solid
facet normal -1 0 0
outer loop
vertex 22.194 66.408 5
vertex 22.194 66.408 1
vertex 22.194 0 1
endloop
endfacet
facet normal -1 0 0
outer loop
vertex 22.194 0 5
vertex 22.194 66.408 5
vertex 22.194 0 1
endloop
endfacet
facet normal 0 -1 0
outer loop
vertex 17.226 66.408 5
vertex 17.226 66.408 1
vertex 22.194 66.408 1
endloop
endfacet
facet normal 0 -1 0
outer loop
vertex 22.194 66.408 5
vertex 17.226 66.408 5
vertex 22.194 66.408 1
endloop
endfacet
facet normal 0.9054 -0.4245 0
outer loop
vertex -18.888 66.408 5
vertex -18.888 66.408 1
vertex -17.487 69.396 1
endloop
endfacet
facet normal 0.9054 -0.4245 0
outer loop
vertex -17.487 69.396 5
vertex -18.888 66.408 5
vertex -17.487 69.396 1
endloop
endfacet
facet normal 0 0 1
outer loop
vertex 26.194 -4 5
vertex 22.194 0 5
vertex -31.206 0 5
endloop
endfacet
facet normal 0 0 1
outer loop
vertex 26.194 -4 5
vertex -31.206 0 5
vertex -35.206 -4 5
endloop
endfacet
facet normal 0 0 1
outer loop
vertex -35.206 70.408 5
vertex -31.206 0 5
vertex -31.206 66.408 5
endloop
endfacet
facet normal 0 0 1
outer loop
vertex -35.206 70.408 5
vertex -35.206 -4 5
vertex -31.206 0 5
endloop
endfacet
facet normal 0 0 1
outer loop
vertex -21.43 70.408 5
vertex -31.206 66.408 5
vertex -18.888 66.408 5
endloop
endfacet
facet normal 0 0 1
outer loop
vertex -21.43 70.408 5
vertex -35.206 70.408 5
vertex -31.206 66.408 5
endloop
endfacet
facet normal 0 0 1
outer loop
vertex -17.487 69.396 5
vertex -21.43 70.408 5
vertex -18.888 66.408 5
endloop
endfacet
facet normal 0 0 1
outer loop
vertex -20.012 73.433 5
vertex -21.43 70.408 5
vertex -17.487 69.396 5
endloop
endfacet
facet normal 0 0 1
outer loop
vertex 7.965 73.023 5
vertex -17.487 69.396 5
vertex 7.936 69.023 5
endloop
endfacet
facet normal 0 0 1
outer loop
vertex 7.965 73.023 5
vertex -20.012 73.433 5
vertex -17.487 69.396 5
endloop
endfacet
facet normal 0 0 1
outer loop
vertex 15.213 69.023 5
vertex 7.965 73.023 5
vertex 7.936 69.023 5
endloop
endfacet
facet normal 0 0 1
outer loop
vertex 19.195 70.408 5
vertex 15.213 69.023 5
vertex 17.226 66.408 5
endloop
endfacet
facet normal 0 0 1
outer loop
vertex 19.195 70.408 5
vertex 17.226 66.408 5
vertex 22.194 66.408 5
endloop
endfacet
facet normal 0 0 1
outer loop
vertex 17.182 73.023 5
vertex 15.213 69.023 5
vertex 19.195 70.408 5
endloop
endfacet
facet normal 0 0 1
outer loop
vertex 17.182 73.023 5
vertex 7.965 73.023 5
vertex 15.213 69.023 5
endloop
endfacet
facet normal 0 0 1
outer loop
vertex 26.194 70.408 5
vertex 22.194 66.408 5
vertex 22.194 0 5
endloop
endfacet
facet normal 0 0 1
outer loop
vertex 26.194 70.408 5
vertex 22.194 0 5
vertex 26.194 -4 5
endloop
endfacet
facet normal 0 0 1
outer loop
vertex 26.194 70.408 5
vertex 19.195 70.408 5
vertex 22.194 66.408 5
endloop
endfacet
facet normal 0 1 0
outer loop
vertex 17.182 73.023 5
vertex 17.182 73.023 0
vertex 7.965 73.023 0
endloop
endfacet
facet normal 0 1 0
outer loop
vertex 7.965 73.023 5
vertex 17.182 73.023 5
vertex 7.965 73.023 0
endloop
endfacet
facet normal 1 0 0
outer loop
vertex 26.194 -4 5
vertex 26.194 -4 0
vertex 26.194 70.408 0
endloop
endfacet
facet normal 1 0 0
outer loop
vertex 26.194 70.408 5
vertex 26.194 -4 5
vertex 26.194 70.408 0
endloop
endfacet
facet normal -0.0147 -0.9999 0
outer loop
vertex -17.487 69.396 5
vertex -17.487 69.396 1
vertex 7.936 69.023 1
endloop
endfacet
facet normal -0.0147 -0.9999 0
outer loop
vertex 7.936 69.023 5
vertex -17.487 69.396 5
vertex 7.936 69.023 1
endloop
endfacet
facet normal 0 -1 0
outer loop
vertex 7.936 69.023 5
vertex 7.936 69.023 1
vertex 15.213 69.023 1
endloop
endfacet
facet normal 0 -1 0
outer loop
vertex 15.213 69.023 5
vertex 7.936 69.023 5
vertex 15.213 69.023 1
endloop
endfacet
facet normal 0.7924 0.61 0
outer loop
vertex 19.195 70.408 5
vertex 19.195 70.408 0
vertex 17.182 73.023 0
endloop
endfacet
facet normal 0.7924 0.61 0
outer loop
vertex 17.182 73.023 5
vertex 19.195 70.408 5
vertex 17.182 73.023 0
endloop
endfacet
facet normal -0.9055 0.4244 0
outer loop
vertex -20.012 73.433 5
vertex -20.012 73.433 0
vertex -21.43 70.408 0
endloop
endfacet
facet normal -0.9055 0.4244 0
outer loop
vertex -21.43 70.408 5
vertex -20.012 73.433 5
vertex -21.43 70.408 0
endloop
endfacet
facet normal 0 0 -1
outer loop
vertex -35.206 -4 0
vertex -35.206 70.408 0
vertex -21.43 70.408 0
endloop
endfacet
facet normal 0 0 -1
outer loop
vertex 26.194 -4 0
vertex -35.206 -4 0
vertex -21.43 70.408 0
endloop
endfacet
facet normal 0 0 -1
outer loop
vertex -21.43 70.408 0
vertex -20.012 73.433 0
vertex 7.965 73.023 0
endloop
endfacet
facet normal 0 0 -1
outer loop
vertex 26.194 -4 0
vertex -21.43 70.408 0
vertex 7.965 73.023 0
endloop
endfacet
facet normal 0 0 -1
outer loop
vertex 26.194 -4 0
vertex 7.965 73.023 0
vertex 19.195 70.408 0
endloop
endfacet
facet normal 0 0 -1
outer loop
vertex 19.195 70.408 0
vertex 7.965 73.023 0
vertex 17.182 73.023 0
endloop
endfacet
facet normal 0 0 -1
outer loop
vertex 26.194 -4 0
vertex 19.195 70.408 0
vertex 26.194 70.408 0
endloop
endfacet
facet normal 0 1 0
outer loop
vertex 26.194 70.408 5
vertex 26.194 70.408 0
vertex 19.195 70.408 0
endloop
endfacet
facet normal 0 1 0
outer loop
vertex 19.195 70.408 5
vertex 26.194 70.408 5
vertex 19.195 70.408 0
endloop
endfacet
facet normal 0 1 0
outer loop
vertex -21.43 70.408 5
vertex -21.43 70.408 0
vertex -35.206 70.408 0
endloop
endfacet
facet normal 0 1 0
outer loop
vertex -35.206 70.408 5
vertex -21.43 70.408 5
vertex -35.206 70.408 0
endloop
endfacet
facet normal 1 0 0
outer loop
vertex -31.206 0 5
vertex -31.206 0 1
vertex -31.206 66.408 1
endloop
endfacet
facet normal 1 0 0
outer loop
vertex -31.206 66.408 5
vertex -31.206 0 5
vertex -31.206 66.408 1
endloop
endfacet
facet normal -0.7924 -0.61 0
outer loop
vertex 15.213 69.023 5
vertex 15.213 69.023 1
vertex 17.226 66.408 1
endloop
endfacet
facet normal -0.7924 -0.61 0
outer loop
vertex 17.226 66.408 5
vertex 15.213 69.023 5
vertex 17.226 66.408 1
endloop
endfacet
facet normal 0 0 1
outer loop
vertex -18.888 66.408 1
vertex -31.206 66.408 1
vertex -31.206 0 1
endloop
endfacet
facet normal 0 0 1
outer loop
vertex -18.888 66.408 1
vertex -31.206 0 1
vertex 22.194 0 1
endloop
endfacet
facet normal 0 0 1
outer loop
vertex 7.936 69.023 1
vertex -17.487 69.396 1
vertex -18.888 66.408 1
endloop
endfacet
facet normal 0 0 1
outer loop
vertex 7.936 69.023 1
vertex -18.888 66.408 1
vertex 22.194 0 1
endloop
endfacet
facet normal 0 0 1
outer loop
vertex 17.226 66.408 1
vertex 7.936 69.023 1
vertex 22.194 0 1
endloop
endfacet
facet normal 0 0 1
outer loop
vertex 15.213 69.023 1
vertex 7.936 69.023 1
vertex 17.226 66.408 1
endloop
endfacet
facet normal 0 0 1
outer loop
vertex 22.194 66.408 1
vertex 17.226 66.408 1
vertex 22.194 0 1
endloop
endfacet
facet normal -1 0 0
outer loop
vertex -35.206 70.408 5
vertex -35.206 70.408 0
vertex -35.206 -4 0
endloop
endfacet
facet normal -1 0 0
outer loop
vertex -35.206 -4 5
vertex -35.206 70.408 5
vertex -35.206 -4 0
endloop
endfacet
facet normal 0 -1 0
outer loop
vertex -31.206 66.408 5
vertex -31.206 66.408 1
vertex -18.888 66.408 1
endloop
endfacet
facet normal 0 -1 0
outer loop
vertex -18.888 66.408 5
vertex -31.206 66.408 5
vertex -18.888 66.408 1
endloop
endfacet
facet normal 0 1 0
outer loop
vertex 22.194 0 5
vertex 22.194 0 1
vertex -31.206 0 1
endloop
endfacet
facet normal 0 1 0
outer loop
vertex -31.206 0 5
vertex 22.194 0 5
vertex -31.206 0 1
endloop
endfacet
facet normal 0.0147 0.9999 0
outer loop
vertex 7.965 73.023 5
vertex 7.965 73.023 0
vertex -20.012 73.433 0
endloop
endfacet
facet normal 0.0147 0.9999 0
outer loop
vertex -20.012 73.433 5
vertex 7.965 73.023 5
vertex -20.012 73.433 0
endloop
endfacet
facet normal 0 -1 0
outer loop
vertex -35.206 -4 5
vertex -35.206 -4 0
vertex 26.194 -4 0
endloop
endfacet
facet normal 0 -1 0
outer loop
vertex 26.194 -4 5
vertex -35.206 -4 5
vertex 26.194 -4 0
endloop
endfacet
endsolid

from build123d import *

# Parameters (mm, degrees)
F1_DEPTH = 5
F2_DEPTH = 1


with BuildPart() as f1:
    # F0 (on Top) → F1 (new body)
    with BuildSketch(Plane.XY):
        Polygon((19.19481, 70.408), (17.181838, 73.022946), (7.964966, 73.022946), (-20.01172, 73.433359), (-21.430185, 70.408), (-31.604451, 70.408), (-35.205591, 70.408), (-35.205591, -4), (26.194409, -4), (26.194409, 70.408), align=None)
        Polygon((22.194409, 0), (-31.205591, 0), (-31.205591, 66.408), (-18.887785, 66.408), (-17.486888, 69.39589), (7.935628, 69.022946), (15.213112, 69.022946), (17.226085, 66.408), (22.194409, 66.408), align=None, mode=Mode.SUBTRACT)
    extrude(amount=F1_DEPTH)

    # F0 (on Top) → F2 (join)
    with BuildSketch(Plane.XY):
        Polygon((-31.205591, 66.408), (-31.205591, 0), (22.194409, 0), (22.194409, 66.408), (17.226085, 66.408), (15.213112, 69.022946), (7.935628, 69.022946), (-17.486888, 69.39589), (-18.887785, 66.408), align=None)
    extrude(amount=F2_DEPTH)


solid = f1.part
